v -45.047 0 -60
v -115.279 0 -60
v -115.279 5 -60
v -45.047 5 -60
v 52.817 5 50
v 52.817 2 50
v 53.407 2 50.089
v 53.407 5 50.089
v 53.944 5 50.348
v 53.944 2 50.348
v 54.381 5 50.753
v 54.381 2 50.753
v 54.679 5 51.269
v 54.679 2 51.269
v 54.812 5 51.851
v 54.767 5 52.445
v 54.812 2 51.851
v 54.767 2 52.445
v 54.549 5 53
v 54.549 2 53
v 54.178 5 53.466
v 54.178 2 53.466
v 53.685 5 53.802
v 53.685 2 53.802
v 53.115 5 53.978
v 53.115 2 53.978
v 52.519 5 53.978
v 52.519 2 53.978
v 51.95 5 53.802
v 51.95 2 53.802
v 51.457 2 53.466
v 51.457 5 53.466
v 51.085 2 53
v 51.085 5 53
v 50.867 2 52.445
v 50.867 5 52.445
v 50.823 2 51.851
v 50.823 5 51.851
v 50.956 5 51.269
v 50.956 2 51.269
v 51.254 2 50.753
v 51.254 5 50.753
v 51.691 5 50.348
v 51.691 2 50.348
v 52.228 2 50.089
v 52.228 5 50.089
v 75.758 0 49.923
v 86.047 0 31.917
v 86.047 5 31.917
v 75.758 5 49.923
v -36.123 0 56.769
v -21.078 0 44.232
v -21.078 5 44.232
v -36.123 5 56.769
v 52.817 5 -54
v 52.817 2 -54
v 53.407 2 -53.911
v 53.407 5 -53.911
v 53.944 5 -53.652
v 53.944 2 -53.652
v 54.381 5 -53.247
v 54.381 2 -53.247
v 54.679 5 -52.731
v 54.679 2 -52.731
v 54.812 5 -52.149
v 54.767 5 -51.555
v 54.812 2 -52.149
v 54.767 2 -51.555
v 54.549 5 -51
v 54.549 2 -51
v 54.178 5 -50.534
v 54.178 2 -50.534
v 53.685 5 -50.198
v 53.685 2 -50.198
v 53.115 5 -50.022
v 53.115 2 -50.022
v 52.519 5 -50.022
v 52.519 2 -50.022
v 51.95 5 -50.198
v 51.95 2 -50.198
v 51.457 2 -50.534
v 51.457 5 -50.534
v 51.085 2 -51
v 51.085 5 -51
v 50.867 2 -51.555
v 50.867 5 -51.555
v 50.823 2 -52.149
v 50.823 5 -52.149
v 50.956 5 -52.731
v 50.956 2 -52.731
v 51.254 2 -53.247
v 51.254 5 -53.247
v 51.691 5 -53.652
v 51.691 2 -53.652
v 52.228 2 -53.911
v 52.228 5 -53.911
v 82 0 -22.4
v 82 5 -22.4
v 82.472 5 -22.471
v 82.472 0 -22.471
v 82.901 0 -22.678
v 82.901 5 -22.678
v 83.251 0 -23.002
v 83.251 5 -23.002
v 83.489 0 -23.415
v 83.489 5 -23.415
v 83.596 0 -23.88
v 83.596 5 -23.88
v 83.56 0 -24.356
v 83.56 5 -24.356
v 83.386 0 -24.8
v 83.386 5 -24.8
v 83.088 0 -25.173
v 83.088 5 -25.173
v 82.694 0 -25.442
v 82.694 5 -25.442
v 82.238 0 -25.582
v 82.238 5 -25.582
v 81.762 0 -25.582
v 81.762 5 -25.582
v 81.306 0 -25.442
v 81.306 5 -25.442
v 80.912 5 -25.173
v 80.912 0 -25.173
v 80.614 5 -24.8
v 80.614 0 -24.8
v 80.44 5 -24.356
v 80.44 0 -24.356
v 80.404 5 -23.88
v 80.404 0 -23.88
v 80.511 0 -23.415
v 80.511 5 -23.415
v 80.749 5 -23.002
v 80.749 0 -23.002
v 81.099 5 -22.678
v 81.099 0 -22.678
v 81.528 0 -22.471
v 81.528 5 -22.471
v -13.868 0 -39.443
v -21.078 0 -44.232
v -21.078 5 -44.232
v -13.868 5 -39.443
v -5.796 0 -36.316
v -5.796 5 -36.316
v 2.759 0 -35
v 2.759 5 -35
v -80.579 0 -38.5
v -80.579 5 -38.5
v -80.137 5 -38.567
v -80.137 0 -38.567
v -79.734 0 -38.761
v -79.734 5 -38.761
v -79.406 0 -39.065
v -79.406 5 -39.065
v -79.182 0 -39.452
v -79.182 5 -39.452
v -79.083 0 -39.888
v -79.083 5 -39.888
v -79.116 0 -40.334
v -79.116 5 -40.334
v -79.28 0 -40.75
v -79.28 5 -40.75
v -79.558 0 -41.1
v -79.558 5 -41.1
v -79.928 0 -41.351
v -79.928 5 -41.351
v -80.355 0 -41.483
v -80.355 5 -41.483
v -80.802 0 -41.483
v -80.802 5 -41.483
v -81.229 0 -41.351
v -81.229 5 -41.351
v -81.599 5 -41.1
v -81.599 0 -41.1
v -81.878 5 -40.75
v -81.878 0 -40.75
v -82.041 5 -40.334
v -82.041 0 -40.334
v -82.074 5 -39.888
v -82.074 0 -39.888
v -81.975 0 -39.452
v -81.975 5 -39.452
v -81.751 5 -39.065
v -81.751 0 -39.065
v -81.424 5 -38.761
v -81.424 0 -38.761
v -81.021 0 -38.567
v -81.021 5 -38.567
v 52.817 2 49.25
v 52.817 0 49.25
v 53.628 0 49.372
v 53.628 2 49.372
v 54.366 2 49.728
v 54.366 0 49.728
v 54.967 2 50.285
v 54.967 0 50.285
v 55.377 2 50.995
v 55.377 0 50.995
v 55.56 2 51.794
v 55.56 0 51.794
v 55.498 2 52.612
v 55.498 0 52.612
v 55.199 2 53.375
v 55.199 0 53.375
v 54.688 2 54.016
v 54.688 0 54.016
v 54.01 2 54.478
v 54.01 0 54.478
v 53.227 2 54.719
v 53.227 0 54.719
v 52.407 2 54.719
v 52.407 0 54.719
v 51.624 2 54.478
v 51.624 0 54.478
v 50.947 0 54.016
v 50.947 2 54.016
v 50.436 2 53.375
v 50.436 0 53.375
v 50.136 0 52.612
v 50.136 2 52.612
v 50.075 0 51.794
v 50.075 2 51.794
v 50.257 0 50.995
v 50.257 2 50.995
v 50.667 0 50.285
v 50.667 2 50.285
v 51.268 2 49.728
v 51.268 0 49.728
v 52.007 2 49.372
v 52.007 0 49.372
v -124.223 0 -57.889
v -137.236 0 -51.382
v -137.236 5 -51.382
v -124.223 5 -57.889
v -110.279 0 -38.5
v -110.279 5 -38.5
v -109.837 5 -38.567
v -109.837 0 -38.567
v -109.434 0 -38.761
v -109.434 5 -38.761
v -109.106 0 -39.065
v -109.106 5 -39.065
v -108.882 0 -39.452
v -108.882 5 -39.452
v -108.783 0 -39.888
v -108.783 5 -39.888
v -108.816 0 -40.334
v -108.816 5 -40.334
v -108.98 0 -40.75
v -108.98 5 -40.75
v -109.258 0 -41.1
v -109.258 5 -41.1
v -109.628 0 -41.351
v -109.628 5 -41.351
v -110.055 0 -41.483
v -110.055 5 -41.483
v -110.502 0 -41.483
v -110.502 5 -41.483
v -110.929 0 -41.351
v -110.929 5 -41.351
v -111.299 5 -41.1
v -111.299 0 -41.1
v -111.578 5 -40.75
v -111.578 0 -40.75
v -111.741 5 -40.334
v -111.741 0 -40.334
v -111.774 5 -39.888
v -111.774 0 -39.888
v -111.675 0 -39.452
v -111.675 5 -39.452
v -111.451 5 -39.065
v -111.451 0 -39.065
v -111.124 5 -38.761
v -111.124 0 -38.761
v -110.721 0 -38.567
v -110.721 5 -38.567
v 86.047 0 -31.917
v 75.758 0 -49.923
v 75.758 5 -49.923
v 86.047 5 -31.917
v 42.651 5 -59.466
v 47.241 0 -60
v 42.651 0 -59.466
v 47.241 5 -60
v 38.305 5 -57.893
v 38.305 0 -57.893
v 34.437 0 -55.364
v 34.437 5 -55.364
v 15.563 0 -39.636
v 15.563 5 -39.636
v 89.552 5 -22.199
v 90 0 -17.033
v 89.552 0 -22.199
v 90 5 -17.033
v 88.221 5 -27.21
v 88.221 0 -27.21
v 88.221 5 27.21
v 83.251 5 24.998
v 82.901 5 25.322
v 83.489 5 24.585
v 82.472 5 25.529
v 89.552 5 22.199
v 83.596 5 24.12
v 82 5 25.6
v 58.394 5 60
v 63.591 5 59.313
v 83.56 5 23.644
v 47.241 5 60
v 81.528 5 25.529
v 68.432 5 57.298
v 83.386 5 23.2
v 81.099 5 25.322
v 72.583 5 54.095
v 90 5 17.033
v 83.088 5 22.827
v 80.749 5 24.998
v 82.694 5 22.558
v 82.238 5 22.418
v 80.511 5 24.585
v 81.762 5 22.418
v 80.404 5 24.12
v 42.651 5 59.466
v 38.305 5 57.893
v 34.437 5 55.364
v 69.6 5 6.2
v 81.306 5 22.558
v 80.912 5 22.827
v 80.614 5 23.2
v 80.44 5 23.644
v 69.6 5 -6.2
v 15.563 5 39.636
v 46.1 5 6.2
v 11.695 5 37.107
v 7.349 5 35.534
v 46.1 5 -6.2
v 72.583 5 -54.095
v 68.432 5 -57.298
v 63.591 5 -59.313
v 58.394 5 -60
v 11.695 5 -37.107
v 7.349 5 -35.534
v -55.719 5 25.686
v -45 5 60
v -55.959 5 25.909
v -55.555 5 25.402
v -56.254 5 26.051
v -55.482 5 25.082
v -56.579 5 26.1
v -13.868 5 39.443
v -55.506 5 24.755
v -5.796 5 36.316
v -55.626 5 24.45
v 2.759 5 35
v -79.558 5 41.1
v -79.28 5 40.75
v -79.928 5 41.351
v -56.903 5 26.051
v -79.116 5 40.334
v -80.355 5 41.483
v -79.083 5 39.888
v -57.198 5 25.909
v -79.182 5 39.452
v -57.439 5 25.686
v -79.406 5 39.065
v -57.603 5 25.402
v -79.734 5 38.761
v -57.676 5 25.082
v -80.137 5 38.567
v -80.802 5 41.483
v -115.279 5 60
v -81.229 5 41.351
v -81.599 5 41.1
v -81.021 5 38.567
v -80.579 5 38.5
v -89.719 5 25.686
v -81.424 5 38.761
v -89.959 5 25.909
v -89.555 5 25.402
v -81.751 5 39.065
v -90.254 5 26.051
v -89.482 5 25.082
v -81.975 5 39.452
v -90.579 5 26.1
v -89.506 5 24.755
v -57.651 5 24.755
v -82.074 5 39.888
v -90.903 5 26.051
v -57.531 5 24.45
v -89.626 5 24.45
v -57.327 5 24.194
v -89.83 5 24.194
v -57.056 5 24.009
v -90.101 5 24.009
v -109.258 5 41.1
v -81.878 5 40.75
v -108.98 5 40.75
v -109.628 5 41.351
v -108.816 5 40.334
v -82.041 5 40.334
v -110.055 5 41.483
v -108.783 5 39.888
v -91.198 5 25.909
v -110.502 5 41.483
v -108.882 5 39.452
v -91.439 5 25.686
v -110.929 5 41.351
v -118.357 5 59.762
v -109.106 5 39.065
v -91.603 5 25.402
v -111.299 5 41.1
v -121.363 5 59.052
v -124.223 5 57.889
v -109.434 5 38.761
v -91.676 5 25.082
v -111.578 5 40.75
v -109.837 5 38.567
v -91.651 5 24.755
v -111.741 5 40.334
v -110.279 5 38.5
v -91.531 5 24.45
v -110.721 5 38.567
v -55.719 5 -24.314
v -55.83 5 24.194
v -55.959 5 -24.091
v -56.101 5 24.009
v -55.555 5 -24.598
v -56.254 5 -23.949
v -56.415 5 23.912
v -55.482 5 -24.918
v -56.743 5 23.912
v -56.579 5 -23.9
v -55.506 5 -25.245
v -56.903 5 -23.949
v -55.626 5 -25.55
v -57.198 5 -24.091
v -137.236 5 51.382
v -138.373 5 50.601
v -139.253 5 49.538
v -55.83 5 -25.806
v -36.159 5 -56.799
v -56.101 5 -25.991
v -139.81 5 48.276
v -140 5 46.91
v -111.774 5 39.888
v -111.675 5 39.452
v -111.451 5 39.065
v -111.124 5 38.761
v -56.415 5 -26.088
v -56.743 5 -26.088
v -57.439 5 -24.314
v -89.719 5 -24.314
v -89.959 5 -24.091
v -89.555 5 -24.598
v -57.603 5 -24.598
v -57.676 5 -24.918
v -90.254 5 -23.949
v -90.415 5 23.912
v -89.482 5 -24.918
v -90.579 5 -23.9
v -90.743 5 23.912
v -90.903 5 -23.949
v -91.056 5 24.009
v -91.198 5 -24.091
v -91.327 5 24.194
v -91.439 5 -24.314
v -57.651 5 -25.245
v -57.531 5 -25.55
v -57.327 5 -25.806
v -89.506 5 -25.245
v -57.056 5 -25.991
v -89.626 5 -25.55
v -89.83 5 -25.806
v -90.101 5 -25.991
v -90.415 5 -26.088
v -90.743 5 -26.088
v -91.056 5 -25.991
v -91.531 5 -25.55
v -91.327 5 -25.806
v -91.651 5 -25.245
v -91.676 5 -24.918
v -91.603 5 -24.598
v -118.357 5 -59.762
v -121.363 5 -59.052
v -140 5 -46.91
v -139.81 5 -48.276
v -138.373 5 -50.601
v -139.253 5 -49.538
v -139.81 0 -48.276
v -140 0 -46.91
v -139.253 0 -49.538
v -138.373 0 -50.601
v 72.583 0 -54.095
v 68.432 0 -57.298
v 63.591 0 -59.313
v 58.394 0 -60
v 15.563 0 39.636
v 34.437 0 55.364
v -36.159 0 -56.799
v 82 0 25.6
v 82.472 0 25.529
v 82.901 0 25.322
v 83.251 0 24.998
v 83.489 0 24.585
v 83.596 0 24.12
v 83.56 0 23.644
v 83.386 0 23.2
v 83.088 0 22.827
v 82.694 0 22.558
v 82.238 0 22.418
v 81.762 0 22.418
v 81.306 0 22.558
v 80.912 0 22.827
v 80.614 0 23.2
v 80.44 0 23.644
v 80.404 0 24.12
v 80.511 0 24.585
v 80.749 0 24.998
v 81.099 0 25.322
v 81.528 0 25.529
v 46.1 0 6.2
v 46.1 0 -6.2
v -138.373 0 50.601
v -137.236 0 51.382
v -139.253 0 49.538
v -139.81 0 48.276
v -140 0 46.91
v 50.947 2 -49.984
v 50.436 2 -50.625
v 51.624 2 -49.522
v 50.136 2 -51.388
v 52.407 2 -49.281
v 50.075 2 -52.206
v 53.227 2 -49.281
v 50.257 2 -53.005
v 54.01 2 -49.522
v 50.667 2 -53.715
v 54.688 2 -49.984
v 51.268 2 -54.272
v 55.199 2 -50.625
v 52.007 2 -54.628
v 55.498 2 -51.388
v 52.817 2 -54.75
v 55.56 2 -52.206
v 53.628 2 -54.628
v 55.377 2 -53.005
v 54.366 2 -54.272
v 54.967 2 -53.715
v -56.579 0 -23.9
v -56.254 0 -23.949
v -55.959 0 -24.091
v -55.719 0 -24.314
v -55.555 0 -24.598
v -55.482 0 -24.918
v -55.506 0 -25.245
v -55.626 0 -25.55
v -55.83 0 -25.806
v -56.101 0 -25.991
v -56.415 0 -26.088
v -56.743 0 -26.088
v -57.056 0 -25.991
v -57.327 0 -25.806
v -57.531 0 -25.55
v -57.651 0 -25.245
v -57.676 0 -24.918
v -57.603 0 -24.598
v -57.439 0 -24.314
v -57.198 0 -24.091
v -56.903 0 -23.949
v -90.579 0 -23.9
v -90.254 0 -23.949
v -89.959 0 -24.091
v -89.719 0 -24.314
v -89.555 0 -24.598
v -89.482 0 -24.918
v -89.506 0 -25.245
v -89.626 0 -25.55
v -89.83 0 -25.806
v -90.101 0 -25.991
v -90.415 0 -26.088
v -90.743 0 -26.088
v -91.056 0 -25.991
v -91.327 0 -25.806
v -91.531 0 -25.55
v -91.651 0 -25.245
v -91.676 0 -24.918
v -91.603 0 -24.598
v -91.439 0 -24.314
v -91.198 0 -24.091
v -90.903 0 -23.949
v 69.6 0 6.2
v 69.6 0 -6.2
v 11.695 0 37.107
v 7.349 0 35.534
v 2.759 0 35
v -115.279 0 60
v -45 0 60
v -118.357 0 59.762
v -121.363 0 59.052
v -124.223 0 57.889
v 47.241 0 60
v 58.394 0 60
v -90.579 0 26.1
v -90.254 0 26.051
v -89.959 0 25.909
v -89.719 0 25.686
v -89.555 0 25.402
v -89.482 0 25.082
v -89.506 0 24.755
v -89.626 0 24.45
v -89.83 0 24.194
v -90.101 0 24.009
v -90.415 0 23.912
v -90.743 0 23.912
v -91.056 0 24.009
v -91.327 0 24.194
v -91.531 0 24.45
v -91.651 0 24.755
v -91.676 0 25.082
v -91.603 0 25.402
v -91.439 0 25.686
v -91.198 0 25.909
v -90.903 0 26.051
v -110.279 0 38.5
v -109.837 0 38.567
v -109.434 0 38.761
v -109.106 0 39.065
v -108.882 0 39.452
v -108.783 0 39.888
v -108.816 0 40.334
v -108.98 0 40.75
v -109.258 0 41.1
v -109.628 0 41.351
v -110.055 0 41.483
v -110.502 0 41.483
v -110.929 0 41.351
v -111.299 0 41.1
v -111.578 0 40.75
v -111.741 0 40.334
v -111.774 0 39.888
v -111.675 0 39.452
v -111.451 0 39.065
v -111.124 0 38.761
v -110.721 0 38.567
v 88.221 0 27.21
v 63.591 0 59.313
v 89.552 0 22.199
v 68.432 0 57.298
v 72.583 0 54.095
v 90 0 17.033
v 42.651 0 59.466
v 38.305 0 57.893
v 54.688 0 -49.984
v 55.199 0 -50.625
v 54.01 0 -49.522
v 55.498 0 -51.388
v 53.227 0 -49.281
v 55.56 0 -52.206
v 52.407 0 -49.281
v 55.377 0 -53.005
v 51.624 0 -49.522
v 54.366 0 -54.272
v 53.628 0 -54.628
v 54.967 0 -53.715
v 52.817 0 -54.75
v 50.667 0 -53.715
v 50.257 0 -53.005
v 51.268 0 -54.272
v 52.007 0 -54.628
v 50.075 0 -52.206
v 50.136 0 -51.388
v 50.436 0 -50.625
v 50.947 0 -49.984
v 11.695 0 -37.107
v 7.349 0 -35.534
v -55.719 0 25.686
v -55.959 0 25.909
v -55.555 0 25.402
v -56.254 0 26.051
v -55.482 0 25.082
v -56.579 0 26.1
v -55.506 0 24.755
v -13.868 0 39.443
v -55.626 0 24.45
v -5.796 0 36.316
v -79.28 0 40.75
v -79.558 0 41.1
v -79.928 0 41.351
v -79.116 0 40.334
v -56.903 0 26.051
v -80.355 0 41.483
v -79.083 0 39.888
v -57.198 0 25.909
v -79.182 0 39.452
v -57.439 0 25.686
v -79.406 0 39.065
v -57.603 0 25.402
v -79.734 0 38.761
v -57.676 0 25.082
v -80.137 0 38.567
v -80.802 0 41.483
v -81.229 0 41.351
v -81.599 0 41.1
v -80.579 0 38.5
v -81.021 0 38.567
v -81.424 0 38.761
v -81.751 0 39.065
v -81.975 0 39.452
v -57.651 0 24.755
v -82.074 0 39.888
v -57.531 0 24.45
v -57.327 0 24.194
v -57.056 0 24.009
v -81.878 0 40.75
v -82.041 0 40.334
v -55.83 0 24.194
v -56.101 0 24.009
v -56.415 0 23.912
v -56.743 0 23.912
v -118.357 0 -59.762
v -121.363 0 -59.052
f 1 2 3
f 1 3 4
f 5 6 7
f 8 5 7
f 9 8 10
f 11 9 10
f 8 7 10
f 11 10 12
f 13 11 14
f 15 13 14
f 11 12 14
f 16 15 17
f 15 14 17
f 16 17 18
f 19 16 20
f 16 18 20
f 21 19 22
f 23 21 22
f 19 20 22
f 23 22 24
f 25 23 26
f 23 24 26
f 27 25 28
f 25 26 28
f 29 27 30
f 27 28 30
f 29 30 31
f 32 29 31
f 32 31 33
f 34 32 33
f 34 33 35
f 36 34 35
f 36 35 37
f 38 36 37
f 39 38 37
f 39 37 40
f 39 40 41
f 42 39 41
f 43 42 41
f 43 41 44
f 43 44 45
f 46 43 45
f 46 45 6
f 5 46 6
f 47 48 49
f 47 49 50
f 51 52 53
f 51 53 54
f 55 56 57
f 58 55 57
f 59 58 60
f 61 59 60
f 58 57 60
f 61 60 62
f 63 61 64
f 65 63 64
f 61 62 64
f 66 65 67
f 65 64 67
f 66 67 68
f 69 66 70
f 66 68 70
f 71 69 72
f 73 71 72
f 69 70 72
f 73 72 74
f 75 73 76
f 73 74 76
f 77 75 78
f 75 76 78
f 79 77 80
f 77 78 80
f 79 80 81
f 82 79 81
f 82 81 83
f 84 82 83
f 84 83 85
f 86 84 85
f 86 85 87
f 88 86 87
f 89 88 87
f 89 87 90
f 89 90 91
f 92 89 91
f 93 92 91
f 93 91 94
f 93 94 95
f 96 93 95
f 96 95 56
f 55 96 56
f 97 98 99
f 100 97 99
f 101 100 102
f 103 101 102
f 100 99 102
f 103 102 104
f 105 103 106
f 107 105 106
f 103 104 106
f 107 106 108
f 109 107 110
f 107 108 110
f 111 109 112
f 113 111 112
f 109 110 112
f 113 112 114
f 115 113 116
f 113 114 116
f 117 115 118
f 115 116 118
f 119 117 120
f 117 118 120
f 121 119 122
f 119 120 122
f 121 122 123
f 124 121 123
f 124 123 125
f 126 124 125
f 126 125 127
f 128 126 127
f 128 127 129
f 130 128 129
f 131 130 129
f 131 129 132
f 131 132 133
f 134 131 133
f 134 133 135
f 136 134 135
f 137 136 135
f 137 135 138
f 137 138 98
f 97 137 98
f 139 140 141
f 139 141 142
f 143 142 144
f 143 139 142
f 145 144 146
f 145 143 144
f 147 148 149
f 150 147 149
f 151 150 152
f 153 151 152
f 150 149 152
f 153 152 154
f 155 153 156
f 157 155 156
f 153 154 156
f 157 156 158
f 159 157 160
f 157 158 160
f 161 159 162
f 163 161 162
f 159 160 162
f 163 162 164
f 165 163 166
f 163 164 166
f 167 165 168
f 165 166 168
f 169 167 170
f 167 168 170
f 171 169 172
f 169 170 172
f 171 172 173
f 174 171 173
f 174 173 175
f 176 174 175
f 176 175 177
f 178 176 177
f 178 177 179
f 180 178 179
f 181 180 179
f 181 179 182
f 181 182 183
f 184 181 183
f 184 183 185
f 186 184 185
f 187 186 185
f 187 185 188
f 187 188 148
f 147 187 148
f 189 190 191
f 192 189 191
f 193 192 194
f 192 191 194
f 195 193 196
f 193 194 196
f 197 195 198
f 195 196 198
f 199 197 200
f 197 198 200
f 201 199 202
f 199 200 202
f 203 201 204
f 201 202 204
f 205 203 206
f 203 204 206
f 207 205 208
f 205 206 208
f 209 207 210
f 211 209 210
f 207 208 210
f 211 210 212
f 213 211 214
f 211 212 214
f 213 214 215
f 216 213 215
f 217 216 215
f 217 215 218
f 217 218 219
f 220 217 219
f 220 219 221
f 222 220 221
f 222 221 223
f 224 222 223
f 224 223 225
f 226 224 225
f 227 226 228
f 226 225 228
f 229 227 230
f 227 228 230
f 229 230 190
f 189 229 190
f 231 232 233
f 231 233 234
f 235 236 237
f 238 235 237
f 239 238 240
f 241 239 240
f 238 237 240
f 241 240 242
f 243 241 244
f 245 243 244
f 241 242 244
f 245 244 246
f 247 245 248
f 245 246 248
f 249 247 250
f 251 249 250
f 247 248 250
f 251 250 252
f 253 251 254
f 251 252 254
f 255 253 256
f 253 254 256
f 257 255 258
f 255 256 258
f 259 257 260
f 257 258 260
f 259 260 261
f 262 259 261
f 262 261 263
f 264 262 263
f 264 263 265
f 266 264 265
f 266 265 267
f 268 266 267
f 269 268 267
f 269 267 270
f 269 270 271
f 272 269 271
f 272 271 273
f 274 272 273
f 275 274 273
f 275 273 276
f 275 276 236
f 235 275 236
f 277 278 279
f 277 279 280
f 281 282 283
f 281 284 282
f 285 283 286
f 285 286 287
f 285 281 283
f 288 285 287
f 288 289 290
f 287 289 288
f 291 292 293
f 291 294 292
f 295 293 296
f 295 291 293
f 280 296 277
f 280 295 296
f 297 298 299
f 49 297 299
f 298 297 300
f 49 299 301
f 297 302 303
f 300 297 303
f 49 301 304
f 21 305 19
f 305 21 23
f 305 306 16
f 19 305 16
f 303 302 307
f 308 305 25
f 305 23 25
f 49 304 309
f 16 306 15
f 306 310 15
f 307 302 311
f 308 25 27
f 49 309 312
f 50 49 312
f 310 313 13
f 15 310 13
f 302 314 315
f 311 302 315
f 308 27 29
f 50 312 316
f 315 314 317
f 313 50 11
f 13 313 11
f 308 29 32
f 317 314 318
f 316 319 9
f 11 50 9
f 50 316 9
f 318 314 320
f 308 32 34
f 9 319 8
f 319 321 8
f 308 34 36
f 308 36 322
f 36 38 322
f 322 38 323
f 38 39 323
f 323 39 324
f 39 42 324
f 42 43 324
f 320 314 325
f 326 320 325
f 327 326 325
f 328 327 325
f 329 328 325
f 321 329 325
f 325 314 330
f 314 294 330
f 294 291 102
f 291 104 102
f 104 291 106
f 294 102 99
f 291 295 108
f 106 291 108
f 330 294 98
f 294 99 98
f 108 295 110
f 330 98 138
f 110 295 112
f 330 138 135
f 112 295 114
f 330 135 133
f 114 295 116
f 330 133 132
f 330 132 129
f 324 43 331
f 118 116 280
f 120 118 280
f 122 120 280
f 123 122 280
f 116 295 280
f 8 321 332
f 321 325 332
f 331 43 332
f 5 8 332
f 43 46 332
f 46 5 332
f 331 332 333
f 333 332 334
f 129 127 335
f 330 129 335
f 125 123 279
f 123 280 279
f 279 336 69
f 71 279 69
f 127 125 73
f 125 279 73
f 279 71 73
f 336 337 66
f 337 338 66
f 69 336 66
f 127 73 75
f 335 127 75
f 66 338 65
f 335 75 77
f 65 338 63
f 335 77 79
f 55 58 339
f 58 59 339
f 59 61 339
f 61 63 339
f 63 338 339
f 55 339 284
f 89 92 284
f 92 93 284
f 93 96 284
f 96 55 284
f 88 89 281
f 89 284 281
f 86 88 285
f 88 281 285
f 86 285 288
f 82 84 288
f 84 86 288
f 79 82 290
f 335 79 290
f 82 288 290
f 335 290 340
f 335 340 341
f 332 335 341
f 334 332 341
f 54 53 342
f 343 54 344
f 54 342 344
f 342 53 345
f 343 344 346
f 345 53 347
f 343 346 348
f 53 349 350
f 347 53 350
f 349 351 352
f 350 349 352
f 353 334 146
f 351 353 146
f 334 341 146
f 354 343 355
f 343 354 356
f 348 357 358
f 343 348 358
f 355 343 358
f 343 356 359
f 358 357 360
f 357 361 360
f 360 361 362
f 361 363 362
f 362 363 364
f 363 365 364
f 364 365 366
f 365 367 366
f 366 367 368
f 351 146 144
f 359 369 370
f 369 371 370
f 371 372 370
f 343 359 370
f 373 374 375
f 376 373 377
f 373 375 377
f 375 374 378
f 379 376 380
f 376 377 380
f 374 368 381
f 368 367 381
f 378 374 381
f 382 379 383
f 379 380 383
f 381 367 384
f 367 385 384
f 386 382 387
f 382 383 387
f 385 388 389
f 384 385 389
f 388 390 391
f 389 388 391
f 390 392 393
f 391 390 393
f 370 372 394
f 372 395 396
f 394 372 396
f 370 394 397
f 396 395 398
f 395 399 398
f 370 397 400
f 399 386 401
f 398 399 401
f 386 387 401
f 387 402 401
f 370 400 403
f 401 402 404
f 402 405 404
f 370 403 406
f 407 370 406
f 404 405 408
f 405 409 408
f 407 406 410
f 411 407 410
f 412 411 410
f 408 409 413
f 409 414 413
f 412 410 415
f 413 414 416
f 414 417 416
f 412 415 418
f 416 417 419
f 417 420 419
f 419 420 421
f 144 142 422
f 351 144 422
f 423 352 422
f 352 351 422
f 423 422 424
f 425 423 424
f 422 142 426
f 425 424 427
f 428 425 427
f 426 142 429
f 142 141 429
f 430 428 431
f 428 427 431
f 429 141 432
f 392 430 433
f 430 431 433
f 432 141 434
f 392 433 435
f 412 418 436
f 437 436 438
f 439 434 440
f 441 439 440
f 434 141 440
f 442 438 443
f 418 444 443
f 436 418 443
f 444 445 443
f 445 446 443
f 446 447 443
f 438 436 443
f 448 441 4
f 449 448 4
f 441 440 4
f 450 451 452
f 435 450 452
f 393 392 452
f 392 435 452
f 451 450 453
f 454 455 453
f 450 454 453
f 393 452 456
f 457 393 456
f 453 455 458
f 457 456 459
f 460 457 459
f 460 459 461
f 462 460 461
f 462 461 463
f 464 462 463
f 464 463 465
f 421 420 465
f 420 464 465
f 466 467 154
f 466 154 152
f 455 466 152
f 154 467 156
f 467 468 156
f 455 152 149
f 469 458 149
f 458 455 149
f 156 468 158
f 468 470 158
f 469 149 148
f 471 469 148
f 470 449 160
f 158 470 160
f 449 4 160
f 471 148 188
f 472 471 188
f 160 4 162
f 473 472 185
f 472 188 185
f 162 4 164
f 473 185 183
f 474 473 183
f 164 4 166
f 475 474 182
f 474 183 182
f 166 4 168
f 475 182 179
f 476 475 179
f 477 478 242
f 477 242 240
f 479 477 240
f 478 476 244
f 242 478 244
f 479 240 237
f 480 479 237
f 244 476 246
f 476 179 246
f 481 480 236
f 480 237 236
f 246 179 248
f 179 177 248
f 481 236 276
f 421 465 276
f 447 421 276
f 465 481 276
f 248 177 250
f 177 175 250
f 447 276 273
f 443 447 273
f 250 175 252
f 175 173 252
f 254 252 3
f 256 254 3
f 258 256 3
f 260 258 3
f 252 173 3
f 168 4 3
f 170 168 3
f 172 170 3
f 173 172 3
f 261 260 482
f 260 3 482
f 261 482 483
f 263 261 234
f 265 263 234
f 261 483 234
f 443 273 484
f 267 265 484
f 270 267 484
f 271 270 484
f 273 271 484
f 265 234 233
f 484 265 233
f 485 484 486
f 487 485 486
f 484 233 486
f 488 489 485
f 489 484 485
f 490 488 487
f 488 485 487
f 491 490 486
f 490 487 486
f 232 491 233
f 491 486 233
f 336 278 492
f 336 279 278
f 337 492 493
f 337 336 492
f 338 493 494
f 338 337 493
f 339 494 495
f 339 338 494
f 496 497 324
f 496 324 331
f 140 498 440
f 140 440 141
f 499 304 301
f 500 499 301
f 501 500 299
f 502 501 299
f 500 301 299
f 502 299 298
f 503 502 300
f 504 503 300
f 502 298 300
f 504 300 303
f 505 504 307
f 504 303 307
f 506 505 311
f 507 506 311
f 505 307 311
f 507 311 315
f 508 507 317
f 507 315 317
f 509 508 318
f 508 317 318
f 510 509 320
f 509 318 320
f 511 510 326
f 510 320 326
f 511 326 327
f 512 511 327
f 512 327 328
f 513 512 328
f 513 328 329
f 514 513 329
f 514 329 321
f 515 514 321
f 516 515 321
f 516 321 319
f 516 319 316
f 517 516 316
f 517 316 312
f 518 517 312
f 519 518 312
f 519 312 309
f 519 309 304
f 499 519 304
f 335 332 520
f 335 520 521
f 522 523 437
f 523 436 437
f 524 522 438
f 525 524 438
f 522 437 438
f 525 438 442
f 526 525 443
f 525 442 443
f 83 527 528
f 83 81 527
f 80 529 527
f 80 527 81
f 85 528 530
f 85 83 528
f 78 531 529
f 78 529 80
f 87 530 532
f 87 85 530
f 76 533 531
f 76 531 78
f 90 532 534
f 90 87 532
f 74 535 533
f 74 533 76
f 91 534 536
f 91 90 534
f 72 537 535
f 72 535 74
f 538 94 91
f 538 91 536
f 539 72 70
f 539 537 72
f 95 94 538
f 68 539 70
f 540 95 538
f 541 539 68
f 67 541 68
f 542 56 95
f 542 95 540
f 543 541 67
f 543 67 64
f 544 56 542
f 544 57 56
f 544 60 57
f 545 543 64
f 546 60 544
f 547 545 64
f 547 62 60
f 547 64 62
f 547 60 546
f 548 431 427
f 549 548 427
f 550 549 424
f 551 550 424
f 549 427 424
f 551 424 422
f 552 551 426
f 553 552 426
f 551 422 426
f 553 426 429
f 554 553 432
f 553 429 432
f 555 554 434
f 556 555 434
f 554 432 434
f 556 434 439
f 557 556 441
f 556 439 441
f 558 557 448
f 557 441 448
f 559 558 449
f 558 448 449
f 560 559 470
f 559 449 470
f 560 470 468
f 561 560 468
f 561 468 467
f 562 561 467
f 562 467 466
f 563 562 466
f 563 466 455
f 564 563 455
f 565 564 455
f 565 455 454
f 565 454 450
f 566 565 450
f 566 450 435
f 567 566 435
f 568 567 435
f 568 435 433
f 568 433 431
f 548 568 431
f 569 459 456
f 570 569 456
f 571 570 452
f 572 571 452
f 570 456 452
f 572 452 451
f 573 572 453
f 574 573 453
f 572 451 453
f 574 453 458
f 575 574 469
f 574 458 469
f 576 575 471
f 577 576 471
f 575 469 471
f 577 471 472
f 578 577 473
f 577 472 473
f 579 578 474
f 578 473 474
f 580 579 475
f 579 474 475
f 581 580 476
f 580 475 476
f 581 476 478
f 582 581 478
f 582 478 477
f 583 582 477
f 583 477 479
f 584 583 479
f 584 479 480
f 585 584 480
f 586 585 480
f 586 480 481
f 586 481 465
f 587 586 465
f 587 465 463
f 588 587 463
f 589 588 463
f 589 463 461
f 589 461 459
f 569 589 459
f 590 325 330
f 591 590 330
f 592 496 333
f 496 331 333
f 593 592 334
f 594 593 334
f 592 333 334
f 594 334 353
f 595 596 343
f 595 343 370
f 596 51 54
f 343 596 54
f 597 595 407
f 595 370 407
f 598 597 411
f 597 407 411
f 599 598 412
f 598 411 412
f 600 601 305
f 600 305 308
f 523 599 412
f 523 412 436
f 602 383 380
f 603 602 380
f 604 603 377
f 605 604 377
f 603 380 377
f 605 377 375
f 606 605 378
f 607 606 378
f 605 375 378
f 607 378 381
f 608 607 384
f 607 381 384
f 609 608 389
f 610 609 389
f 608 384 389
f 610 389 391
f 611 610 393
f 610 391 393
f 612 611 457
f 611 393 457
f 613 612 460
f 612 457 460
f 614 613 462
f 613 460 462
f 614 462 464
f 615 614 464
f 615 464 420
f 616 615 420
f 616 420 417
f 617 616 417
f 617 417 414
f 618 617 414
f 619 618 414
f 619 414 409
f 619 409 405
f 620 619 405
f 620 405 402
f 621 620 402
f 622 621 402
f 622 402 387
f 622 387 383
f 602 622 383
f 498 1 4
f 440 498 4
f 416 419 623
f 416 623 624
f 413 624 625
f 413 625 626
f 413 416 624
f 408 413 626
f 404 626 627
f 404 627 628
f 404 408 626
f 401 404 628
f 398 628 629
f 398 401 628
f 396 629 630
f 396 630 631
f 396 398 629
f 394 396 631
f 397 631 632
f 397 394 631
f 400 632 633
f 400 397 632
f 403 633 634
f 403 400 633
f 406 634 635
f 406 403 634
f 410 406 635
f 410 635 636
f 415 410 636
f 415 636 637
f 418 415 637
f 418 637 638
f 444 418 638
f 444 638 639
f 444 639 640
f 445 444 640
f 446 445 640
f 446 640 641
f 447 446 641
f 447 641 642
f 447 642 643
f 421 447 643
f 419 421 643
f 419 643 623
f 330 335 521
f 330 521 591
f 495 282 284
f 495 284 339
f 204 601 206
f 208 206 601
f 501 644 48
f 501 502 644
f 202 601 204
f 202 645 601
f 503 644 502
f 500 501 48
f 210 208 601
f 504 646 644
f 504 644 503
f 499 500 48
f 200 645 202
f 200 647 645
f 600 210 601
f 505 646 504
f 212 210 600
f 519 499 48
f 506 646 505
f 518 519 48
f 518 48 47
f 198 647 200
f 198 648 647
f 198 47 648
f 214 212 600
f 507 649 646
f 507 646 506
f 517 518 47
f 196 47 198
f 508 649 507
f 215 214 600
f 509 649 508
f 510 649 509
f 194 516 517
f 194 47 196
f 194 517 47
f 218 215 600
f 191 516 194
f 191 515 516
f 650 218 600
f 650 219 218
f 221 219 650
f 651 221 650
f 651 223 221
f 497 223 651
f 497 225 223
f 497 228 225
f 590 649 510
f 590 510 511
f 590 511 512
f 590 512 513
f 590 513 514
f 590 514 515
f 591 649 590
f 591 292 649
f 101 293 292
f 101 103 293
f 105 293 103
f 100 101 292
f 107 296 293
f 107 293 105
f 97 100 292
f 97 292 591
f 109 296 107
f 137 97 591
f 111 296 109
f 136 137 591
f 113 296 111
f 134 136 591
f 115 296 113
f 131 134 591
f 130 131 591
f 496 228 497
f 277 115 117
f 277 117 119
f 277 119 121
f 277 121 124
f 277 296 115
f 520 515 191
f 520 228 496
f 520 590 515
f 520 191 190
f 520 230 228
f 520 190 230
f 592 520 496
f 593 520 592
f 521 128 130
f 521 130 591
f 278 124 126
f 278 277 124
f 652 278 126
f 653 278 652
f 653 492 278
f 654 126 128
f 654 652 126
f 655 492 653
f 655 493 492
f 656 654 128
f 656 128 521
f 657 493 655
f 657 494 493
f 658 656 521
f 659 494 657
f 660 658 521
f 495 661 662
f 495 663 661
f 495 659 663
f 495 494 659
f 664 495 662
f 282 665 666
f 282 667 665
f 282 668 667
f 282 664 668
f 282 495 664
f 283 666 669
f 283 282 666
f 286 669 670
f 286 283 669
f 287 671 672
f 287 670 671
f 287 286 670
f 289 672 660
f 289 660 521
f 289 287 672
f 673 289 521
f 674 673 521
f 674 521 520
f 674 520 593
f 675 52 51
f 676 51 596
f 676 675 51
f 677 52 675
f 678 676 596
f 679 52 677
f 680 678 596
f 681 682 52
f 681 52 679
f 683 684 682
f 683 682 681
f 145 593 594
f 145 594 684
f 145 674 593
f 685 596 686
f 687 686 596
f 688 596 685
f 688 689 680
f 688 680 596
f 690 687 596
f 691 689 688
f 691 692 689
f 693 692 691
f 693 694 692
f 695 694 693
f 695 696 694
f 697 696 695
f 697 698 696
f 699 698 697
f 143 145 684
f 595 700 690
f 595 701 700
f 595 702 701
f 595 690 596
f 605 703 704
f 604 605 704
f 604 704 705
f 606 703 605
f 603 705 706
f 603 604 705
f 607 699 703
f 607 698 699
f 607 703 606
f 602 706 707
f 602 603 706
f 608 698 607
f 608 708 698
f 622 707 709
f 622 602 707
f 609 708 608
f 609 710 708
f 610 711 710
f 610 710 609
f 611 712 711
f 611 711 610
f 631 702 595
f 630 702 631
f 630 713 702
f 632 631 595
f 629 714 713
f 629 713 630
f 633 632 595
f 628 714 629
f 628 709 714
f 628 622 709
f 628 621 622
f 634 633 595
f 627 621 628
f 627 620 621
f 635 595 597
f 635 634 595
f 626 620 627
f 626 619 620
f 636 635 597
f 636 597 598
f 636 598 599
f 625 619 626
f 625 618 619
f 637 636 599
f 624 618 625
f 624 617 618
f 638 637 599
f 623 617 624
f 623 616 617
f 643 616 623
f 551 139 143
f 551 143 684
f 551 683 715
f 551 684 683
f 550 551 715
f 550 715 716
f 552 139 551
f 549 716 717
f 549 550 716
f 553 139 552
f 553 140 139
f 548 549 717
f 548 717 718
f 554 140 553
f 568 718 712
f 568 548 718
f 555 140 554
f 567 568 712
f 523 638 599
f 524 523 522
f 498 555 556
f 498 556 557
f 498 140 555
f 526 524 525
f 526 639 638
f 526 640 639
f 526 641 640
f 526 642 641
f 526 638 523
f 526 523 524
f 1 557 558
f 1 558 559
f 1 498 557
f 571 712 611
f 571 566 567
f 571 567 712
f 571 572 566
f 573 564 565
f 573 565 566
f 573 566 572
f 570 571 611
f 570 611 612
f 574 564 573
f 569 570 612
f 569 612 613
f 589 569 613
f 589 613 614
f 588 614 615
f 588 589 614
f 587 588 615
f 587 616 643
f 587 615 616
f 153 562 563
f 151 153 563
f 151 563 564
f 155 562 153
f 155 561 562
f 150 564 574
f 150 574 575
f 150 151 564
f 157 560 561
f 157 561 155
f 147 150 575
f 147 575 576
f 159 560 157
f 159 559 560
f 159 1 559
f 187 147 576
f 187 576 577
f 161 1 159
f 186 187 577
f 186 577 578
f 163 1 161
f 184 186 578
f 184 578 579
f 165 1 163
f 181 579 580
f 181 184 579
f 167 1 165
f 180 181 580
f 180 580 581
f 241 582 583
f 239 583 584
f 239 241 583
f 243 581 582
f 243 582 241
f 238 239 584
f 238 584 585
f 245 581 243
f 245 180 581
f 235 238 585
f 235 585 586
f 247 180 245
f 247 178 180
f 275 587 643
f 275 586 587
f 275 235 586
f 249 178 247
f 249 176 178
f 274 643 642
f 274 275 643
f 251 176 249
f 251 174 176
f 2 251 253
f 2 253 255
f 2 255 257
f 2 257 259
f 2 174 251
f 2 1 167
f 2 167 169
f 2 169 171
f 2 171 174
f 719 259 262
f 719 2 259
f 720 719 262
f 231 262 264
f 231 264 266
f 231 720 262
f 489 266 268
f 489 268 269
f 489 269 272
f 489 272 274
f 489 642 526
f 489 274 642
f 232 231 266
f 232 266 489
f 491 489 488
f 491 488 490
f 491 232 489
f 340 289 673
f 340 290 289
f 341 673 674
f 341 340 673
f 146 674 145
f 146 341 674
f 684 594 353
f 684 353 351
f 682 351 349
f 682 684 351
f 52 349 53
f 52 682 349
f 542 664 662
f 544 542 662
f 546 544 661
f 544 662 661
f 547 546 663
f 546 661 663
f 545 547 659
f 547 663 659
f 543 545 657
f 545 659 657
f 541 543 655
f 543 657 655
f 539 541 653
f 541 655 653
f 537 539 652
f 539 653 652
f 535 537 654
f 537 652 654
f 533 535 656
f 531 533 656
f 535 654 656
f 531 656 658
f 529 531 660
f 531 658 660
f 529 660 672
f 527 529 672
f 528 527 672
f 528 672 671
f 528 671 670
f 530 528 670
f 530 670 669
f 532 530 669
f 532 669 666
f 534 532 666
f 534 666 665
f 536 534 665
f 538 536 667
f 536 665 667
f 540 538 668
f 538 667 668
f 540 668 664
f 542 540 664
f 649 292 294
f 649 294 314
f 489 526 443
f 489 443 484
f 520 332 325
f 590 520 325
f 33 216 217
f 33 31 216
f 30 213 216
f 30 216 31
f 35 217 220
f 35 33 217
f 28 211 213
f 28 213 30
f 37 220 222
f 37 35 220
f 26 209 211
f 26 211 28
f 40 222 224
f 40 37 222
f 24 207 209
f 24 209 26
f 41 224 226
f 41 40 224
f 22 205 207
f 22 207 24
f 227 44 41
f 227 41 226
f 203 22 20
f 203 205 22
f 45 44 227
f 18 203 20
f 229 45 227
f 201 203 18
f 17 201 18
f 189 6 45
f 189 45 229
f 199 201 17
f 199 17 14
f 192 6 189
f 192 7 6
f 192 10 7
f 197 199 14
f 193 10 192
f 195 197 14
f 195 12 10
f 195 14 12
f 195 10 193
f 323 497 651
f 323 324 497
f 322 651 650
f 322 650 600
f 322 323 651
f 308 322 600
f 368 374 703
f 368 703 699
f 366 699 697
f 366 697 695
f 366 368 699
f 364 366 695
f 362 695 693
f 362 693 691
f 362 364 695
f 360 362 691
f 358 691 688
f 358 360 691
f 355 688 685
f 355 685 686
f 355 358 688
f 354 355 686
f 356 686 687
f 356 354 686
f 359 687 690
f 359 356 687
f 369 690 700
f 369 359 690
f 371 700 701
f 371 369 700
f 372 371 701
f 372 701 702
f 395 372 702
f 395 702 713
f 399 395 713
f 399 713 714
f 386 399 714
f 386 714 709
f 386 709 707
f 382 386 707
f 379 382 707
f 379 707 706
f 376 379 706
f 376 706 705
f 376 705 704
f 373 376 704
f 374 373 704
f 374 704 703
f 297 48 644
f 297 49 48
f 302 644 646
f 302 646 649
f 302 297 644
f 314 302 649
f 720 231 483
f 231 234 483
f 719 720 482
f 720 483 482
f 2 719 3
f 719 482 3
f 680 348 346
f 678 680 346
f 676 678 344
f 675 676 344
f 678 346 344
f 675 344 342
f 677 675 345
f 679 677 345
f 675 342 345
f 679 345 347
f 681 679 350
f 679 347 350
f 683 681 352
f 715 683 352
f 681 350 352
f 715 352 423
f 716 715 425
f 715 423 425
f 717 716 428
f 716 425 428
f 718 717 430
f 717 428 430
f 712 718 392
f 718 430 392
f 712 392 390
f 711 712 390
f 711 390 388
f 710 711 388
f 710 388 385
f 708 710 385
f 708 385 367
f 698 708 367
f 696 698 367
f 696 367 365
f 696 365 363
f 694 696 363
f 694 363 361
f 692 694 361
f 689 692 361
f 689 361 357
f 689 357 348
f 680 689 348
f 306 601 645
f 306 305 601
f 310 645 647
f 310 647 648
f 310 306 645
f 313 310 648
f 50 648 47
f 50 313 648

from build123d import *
from OCP.BRepFilletAPI import BRepFilletAPI_MakeChamfer

# Parameters (mm, degrees)
BOSS_EXTRUDE1_DEPTH   = 5
CHAMFER1_SIZE         = 5
CHAMFER1_SIZE2        = 5.047084744
FILLET4_R             = 20
F_4_0MM_DOWEL_HOLE1_D = 4
SKETCH5_R             = 2.75
CUT_EXTRUDE1_DEPTH    = 2
FILLET5_R             = 30
FILLET6_R             = 20
FILLET7_R             = 40
FILLET8_R             = 20
FILLET9_R             = 5
CUT_EXTRUDE3_REACH    = 154.398
SKETCH7_R             = 1.5
CUT_EXTRUDE4_REACH    = 154.398
SKETCH8_W             = 23.5
SKETCH8_H             = 12.4
CUT_EXTRUDE5_REACH    = 154.398
SKETCH9_R             = 1.1
CUT_EXTRUDE6_REACH    = 154.398
SKETCH11_R            = 1.6


with BuildPart() as part:
    # Sketch1 → Boss-Extrude1 (new body)
    with BuildSketch(Plane(origin=(0, 0, 0), x_dir=(1, 0, 0), z_dir=(0, 1, 0))):
        Polygon((40, 60), (70, 60), (90, 25), (90, -25), (70, -60), (40, -60), (10, -35), (-10, -35), (-40, -60), (-120, -60), (-140, -50), (-140, 50), (-120, 60), (-40, 60), (-10, 35), (10, 35), align=None)
    extrude(amount=BOSS_EXTRUDE1_DEPTH)

    # Chamfer1: one chamfer whose edges measure the first distance from different faces: ONE call of the kernel's chamfer builder (chamfer() names one face for all edges)
    chamfer1_edges_1 = [part.edges().sort_by_distance(p)[0] for p in [
        (-40, 2.5, 60),
    ]]
    chamfer1_side_1 = [part.faces().sort_by_distance(p)[0] for p in [
        (-80, 2.5, 60),
    ]]
    chamfer1_edges_2 = [part.edges().sort_by_distance(p)[0] for p in [
        (-40, 2.5, -60),
    ]]
    chamfer1_side_2 = [part.faces().sort_by_distance(p)[0] for p in [
        (-25, 2.5, -47.5),
    ]]
    chamfer1 = BRepFilletAPI_MakeChamfer(part.part.solid().wrapped)
    for e in chamfer1_edges_1:
        chamfer1.Add(CHAMFER1_SIZE, CHAMFER1_SIZE2, e.wrapped, chamfer1_side_1[0].wrapped)  # the first distance lies on this face
    for e in chamfer1_edges_2:
        chamfer1.Add(CHAMFER1_SIZE, CHAMFER1_SIZE2, e.wrapped, chamfer1_side_2[0].wrapped)  # the first distance lies on this face
    add(Compound.cast(chamfer1.Shape()), mode=Mode.REPLACE)

    # Fillet4
    fillet4_edges = [part.edges().sort_by_distance(p)[0] for p in [
        (40, 2.5, -60),
        (70, 2.5, -60),
        (70, 2.5, 60),
        (40, 2.5, 60),
    ]]
    fillet(fillet4_edges, radius=FILLET4_R)

    # Ø4.0mm Dowel Hole1 (through all)
    with Locations(Plane(origin=(52.817273997, 5, -52), x_dir=(0, 0, 1), z_dir=(0, 1, 0))):
        with Locations((0, 0), (104, 0)):
            Hole(F_4_0MM_DOWEL_HOLE1_D / 2)

    # Sketch5 → Cut-Extrude1 (cut)
    with BuildSketch(Plane.XZ):
        with Locations(Location((52.817273997, 52, 0), (0, 0, 270))):
            Circle(SKETCH5_R)
        with Locations(Location((52.817273997, -52, 0), (0, 0, 270))):
            Circle(SKETCH5_R)
    extrude(amount=-CUT_EXTRUDE1_DEPTH, mode=Mode.SUBTRACT)

    # Fillet5
    fillet5_edges = [part.edges().sort_by_distance(p)[0] for p in [
        (90, 2.5, -25),
        (90, 2.5, 25),
    ]]
    fillet(fillet5_edges, radius=FILLET5_R)

    # Fillet6
    fillet6_edges = [part.edges().sort_by_distance(p)[0] for p in [
        (10, 2.5, 35),
        (10, 2.5, -35),
    ]]
    fillet(fillet6_edges, radius=FILLET6_R)

    # Fillet7
    # the kernel refuses this fillet: 40 mm, written as the material it adds along each edge
    with BuildSketch(Plane(origin=(-10, 0, -35), x_dir=(-0.768221279597376, 0, -0.6401843996644798), z_dir=(0, 1, 0))) as fillet7_piece_1:
        with BuildLine():
            CenterArc((14.420794682, -40), FILLET7_R, 90, 37.26938559)
            Line((-9.801736302, -8.168113585), (0, 0))
            Line((0, 0), (14.420794682, 0))
        make_face()
    extrude(amount=5)
    with BuildSketch(Plane(origin=(-10, 0, 35), x_dir=(1, 0, 0), z_dir=(0, 1, 0))) as fillet7_piece_2:
        with BuildLine():
            CenterArc((14.529014643, -39.96081897), FILLET7_R, 92.536185502, 37.26938559)
            Line((-11.078361343, -9.231967786), (0, 0))
            Line((0, 0), (12.759001296, 0))
        make_face()
    extrude(amount=5)

    # Fillet8
    fillet8_edges = [part.edges().sort_by_distance(p)[0] for p in [
        (-120, 2.5, 60),
        (-120, 2.5, -60),
    ]]
    fillet(fillet8_edges, radius=FILLET8_R)

    # Fillet9
    fillet9_edges = [part.edges().sort_by_distance(p)[0] for p in [
        (-140, 2.5, 50),
        (-140, 2.5, -50),
    ]]
    fillet(fillet9_edges, radius=FILLET9_R)

    # Sketch7 → Cut-Extrude3 (cut, up to next)
    with BuildSketch(Plane(origin=(0, 5, 0), x_dir=(1, 0, 0), z_dir=(0, 1, 0)), mode=Mode.PRIVATE) as cut_extrude3_sk1:
        with Locations(Location((-110.27864045, 40, 0), (0, 0, 270))):
            Circle(SKETCH7_R)
    cut_extrude3_tool1 = extrude(cut_extrude3_sk1.sketch, amount=-CUT_EXTRUDE3_REACH, mode=Mode.PRIVATE) & part.part
    # Sketch7 → Cut-Extrude3 (cut, up to next)
    with BuildSketch(Plane(origin=(0, 5, 0), x_dir=(1, 0, 0), z_dir=(0, 1, 0)), mode=Mode.PRIVATE) as cut_extrude3_sk2:
        with Locations(Location((-80.57864045, 40, 0), (0, 0, 270))):
            Circle(SKETCH7_R)
    cut_extrude3_tool2 = extrude(cut_extrude3_sk2.sketch, amount=-CUT_EXTRUDE3_REACH, mode=Mode.PRIVATE) & part.part
    cut_extrude3_1 = cut_extrude3_tool1.solids().sort_by_distance((-110.27864, 5, -40))[0]
    add(cut_extrude3_1, mode=Mode.SUBTRACT)
    cut_extrude3_2 = cut_extrude3_tool2.solids().sort_by_distance((-80.57864, 5, -40))[0]
    add(cut_extrude3_2, mode=Mode.SUBTRACT)
    cut_extrude3 = cut_extrude3_1 + cut_extrude3_2  # Cut-Extrude3 as one shape, for the pattern or mirror that repeats it

    # Mirror1: Cut-Extrude3 across plane
    add(cut_extrude3.mirror(Plane.XY), mode=Mode.SUBTRACT)

    # Sketch8 → Cut-Extrude4 (cut, up to next)
    with BuildSketch(Plane(origin=(0, 5, 0), x_dir=(1, 0, 0), z_dir=(0, 1, 0)), mode=Mode.PRIVATE) as cut_extrude4_sk1:
        with Locations((57.85, 0)):
            Rectangle(SKETCH8_W, SKETCH8_H)
    cut_extrude4_tool1 = extrude(cut_extrude4_sk1.sketch, amount=-CUT_EXTRUDE4_REACH, mode=Mode.PRIVATE) & part.part
    add(cut_extrude4_tool1.solids().sort_by_distance((57.85, 5, 0))[0], mode=Mode.SUBTRACT)

    # Sketch9 → Cut-Extrude5 (cut, up to next)
    with BuildSketch(Plane(origin=(0, 5, 0), x_dir=(1, 0, 0), z_dir=(0, 1, 0)), mode=Mode.PRIVATE) as cut_extrude5_sk1:
        with Locations(Location((-90.57864045, 25, 0), (0, 0, 270))):
            Circle(SKETCH9_R)
    cut_extrude5_tool1 = extrude(cut_extrude5_sk1.sketch, amount=-CUT_EXTRUDE5_REACH, mode=Mode.PRIVATE) & part.part
    # Sketch9 → Cut-Extrude5 (cut, up to next)
    with BuildSketch(Plane(origin=(0, 5, 0), x_dir=(1, 0, 0), z_dir=(0, 1, 0)), mode=Mode.PRIVATE) as cut_extrude5_sk2:
        with Locations(Location((-56.57864045, 25, 0), (0, 0, 270))):
            Circle(SKETCH9_R)
    cut_extrude5_tool2 = extrude(cut_extrude5_sk2.sketch, amount=-CUT_EXTRUDE5_REACH, mode=Mode.PRIVATE) & part.part
    # Sketch9 → Cut-Extrude5 (cut, up to next)
    with BuildSketch(Plane(origin=(0, 5, 0), x_dir=(1, 0, 0), z_dir=(0, 1, 0)), mode=Mode.PRIVATE) as cut_extrude5_sk3:
        with Locations(Location((-90.57864045, -25, 0), (0, 0, 270))):
            Circle(SKETCH9_R)
    cut_extrude5_tool3 = extrude(cut_extrude5_sk3.sketch, amount=-CUT_EXTRUDE5_REACH, mode=Mode.PRIVATE) & part.part
    # Sketch9 → Cut-Extrude5 (cut, up to next)
    with BuildSketch(Plane(origin=(0, 5, 0), x_dir=(1, 0, 0), z_dir=(0, 1, 0)), mode=Mode.PRIVATE) as cut_extrude5_sk4:
        with Locations(Location((-56.57864045, -25, 0), (0, 0, 270))):
            Circle(SKETCH9_R)
    cut_extrude5_tool4 = extrude(cut_extrude5_sk4.sketch, amount=-CUT_EXTRUDE5_REACH, mode=Mode.PRIVATE) & part.part
    add(cut_extrude5_tool1.solids().sort_by_distance((-90.57864, 5, -25))[0], mode=Mode.SUBTRACT)
    add(cut_extrude5_tool2.solids().sort_by_distance((-56.57864, 5, -25))[0], mode=Mode.SUBTRACT)
    add(cut_extrude5_tool3.solids().sort_by_distance((-90.57864, 5, 25))[0], mode=Mode.SUBTRACT)
    add(cut_extrude5_tool4.solids().sort_by_distance((-56.57864, 5, 25))[0], mode=Mode.SUBTRACT)

    # Sketch11 → Cut-Extrude6 (cut, up to next)
    with BuildSketch(Plane(origin=(0, 5, 0), x_dir=(1, 0, 0), z_dir=(0, 1, 0)), mode=Mode.PRIVATE) as cut_extrude6_sk1:
        with Locations(Location((82, 24, 0), (0, 0, 270))):
            Circle(SKETCH11_R)
    cut_extrude6_tool1 = extrude(cut_extrude6_sk1.sketch, amount=-CUT_EXTRUDE6_REACH, mode=Mode.PRIVATE) & part.part
    # Sketch11 → Cut-Extrude6 (cut, up to next)
    with BuildSketch(Plane(origin=(0, 5, 0), x_dir=(1, 0, 0), z_dir=(0, 1, 0)), mode=Mode.PRIVATE) as cut_extrude6_sk2:
        with Locations(Location((82, -24, 0), (0, 0, 270))):
            Circle(SKETCH11_R)
    cut_extrude6_tool2 = extrude(cut_extrude6_sk2.sketch, amount=-CUT_EXTRUDE6_REACH, mode=Mode.PRIVATE) & part.part
    add(cut_extrude6_tool1.solids().sort_by_distance((82, 5, -24))[0], mode=Mode.SUBTRACT)
    add(cut_extrude6_tool2.solids().sort_by_distance((82, 5, 24))[0], mode=Mode.SUBTRACT)


solid = part.part
